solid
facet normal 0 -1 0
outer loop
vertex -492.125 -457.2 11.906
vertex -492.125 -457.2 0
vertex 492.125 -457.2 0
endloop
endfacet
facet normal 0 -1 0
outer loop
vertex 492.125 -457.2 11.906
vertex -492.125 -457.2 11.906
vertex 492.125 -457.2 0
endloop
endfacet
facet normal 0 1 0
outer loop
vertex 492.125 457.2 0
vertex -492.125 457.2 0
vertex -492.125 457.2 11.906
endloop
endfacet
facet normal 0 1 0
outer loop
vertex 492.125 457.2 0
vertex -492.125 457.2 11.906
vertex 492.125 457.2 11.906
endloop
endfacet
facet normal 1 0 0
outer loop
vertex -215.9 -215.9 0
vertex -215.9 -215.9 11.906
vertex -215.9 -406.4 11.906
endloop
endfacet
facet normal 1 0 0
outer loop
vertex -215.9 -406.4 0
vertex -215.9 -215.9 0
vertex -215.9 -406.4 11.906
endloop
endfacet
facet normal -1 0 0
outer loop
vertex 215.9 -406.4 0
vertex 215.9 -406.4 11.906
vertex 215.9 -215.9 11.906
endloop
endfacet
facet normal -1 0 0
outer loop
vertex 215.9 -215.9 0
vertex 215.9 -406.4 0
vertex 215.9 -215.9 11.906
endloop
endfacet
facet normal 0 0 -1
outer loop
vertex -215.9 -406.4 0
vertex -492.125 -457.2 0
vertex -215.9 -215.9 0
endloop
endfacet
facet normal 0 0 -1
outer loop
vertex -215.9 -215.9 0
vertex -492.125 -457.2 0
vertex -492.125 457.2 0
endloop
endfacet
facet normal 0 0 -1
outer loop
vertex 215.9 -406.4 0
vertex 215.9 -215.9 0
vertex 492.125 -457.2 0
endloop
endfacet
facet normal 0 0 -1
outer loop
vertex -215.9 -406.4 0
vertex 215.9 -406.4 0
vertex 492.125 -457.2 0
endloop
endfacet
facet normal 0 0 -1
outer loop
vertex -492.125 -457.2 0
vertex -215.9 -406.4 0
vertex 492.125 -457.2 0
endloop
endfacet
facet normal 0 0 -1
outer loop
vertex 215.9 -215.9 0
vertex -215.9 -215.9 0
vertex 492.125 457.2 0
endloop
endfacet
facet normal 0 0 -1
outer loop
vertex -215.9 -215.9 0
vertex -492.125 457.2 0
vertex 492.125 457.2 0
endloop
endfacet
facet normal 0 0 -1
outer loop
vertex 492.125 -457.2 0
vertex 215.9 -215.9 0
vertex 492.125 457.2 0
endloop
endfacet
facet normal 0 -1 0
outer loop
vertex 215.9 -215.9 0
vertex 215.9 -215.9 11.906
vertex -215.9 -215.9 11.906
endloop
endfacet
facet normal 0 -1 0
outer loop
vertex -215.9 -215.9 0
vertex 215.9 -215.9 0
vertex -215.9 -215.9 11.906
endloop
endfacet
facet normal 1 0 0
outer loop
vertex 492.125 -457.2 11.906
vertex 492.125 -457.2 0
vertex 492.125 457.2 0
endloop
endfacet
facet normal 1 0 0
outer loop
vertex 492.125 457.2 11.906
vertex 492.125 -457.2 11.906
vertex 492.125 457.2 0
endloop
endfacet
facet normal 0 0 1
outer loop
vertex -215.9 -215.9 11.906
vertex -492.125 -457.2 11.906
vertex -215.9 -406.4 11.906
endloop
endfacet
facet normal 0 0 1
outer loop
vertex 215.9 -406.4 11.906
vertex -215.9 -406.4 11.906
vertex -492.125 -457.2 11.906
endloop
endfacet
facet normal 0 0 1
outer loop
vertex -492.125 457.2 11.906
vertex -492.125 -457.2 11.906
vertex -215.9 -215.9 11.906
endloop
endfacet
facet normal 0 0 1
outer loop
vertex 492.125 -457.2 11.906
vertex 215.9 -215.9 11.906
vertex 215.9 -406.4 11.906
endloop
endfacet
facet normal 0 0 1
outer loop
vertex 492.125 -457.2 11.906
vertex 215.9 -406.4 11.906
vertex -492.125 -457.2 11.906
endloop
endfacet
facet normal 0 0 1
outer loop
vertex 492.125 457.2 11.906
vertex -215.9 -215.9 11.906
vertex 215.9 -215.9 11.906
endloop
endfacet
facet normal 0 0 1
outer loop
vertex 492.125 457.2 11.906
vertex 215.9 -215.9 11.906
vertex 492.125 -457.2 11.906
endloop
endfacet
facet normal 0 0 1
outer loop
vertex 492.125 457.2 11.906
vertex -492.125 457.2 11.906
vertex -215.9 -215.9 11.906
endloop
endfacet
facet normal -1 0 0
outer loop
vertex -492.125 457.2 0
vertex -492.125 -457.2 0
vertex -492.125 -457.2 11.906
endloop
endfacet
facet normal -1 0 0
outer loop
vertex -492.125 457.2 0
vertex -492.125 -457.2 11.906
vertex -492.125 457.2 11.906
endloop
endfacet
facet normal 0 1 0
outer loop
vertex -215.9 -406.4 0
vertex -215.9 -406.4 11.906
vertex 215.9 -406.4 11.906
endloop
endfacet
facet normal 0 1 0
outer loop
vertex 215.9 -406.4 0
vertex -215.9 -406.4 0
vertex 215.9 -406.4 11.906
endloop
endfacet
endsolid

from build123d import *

# Parameters (mm, degrees)
SKETCH1_W               = 984.25
SKETCH1_H               = 914.4
BOSS_EXTRUDE1_DEPTH     = 11.90625
CUT_EXTRUDE1_DEPTH      = 1
CUT_EXTRUDE1_DEPTH_BACK = 12.90625


with BuildPart() as part:
    # Sketch1 → Boss-Extrude1 (new body)
    with BuildSketch(Plane.XY):
        Rectangle(SKETCH1_W, SKETCH1_H)
    extrude(amount=BOSS_EXTRUDE1_DEPTH)

    # Sketch3 → Cut-Extrude1 (cut, two sides)
    with BuildSketch(Plane.XY.offset(11.90625)) as cut_extrude1_sk:
        Polygon((0, -406.4), (215.9, -406.4), (215.9, -215.9), (-215.9, -215.9), (-215.9, -406.4), align=None)
    extrude(amount=CUT_EXTRUDE1_DEPTH, mode=Mode.SUBTRACT)
    extrude(cut_extrude1_sk.sketch, amount=-CUT_EXTRUDE1_DEPTH_BACK, mode=Mode.SUBTRACT)


solid = part.part
